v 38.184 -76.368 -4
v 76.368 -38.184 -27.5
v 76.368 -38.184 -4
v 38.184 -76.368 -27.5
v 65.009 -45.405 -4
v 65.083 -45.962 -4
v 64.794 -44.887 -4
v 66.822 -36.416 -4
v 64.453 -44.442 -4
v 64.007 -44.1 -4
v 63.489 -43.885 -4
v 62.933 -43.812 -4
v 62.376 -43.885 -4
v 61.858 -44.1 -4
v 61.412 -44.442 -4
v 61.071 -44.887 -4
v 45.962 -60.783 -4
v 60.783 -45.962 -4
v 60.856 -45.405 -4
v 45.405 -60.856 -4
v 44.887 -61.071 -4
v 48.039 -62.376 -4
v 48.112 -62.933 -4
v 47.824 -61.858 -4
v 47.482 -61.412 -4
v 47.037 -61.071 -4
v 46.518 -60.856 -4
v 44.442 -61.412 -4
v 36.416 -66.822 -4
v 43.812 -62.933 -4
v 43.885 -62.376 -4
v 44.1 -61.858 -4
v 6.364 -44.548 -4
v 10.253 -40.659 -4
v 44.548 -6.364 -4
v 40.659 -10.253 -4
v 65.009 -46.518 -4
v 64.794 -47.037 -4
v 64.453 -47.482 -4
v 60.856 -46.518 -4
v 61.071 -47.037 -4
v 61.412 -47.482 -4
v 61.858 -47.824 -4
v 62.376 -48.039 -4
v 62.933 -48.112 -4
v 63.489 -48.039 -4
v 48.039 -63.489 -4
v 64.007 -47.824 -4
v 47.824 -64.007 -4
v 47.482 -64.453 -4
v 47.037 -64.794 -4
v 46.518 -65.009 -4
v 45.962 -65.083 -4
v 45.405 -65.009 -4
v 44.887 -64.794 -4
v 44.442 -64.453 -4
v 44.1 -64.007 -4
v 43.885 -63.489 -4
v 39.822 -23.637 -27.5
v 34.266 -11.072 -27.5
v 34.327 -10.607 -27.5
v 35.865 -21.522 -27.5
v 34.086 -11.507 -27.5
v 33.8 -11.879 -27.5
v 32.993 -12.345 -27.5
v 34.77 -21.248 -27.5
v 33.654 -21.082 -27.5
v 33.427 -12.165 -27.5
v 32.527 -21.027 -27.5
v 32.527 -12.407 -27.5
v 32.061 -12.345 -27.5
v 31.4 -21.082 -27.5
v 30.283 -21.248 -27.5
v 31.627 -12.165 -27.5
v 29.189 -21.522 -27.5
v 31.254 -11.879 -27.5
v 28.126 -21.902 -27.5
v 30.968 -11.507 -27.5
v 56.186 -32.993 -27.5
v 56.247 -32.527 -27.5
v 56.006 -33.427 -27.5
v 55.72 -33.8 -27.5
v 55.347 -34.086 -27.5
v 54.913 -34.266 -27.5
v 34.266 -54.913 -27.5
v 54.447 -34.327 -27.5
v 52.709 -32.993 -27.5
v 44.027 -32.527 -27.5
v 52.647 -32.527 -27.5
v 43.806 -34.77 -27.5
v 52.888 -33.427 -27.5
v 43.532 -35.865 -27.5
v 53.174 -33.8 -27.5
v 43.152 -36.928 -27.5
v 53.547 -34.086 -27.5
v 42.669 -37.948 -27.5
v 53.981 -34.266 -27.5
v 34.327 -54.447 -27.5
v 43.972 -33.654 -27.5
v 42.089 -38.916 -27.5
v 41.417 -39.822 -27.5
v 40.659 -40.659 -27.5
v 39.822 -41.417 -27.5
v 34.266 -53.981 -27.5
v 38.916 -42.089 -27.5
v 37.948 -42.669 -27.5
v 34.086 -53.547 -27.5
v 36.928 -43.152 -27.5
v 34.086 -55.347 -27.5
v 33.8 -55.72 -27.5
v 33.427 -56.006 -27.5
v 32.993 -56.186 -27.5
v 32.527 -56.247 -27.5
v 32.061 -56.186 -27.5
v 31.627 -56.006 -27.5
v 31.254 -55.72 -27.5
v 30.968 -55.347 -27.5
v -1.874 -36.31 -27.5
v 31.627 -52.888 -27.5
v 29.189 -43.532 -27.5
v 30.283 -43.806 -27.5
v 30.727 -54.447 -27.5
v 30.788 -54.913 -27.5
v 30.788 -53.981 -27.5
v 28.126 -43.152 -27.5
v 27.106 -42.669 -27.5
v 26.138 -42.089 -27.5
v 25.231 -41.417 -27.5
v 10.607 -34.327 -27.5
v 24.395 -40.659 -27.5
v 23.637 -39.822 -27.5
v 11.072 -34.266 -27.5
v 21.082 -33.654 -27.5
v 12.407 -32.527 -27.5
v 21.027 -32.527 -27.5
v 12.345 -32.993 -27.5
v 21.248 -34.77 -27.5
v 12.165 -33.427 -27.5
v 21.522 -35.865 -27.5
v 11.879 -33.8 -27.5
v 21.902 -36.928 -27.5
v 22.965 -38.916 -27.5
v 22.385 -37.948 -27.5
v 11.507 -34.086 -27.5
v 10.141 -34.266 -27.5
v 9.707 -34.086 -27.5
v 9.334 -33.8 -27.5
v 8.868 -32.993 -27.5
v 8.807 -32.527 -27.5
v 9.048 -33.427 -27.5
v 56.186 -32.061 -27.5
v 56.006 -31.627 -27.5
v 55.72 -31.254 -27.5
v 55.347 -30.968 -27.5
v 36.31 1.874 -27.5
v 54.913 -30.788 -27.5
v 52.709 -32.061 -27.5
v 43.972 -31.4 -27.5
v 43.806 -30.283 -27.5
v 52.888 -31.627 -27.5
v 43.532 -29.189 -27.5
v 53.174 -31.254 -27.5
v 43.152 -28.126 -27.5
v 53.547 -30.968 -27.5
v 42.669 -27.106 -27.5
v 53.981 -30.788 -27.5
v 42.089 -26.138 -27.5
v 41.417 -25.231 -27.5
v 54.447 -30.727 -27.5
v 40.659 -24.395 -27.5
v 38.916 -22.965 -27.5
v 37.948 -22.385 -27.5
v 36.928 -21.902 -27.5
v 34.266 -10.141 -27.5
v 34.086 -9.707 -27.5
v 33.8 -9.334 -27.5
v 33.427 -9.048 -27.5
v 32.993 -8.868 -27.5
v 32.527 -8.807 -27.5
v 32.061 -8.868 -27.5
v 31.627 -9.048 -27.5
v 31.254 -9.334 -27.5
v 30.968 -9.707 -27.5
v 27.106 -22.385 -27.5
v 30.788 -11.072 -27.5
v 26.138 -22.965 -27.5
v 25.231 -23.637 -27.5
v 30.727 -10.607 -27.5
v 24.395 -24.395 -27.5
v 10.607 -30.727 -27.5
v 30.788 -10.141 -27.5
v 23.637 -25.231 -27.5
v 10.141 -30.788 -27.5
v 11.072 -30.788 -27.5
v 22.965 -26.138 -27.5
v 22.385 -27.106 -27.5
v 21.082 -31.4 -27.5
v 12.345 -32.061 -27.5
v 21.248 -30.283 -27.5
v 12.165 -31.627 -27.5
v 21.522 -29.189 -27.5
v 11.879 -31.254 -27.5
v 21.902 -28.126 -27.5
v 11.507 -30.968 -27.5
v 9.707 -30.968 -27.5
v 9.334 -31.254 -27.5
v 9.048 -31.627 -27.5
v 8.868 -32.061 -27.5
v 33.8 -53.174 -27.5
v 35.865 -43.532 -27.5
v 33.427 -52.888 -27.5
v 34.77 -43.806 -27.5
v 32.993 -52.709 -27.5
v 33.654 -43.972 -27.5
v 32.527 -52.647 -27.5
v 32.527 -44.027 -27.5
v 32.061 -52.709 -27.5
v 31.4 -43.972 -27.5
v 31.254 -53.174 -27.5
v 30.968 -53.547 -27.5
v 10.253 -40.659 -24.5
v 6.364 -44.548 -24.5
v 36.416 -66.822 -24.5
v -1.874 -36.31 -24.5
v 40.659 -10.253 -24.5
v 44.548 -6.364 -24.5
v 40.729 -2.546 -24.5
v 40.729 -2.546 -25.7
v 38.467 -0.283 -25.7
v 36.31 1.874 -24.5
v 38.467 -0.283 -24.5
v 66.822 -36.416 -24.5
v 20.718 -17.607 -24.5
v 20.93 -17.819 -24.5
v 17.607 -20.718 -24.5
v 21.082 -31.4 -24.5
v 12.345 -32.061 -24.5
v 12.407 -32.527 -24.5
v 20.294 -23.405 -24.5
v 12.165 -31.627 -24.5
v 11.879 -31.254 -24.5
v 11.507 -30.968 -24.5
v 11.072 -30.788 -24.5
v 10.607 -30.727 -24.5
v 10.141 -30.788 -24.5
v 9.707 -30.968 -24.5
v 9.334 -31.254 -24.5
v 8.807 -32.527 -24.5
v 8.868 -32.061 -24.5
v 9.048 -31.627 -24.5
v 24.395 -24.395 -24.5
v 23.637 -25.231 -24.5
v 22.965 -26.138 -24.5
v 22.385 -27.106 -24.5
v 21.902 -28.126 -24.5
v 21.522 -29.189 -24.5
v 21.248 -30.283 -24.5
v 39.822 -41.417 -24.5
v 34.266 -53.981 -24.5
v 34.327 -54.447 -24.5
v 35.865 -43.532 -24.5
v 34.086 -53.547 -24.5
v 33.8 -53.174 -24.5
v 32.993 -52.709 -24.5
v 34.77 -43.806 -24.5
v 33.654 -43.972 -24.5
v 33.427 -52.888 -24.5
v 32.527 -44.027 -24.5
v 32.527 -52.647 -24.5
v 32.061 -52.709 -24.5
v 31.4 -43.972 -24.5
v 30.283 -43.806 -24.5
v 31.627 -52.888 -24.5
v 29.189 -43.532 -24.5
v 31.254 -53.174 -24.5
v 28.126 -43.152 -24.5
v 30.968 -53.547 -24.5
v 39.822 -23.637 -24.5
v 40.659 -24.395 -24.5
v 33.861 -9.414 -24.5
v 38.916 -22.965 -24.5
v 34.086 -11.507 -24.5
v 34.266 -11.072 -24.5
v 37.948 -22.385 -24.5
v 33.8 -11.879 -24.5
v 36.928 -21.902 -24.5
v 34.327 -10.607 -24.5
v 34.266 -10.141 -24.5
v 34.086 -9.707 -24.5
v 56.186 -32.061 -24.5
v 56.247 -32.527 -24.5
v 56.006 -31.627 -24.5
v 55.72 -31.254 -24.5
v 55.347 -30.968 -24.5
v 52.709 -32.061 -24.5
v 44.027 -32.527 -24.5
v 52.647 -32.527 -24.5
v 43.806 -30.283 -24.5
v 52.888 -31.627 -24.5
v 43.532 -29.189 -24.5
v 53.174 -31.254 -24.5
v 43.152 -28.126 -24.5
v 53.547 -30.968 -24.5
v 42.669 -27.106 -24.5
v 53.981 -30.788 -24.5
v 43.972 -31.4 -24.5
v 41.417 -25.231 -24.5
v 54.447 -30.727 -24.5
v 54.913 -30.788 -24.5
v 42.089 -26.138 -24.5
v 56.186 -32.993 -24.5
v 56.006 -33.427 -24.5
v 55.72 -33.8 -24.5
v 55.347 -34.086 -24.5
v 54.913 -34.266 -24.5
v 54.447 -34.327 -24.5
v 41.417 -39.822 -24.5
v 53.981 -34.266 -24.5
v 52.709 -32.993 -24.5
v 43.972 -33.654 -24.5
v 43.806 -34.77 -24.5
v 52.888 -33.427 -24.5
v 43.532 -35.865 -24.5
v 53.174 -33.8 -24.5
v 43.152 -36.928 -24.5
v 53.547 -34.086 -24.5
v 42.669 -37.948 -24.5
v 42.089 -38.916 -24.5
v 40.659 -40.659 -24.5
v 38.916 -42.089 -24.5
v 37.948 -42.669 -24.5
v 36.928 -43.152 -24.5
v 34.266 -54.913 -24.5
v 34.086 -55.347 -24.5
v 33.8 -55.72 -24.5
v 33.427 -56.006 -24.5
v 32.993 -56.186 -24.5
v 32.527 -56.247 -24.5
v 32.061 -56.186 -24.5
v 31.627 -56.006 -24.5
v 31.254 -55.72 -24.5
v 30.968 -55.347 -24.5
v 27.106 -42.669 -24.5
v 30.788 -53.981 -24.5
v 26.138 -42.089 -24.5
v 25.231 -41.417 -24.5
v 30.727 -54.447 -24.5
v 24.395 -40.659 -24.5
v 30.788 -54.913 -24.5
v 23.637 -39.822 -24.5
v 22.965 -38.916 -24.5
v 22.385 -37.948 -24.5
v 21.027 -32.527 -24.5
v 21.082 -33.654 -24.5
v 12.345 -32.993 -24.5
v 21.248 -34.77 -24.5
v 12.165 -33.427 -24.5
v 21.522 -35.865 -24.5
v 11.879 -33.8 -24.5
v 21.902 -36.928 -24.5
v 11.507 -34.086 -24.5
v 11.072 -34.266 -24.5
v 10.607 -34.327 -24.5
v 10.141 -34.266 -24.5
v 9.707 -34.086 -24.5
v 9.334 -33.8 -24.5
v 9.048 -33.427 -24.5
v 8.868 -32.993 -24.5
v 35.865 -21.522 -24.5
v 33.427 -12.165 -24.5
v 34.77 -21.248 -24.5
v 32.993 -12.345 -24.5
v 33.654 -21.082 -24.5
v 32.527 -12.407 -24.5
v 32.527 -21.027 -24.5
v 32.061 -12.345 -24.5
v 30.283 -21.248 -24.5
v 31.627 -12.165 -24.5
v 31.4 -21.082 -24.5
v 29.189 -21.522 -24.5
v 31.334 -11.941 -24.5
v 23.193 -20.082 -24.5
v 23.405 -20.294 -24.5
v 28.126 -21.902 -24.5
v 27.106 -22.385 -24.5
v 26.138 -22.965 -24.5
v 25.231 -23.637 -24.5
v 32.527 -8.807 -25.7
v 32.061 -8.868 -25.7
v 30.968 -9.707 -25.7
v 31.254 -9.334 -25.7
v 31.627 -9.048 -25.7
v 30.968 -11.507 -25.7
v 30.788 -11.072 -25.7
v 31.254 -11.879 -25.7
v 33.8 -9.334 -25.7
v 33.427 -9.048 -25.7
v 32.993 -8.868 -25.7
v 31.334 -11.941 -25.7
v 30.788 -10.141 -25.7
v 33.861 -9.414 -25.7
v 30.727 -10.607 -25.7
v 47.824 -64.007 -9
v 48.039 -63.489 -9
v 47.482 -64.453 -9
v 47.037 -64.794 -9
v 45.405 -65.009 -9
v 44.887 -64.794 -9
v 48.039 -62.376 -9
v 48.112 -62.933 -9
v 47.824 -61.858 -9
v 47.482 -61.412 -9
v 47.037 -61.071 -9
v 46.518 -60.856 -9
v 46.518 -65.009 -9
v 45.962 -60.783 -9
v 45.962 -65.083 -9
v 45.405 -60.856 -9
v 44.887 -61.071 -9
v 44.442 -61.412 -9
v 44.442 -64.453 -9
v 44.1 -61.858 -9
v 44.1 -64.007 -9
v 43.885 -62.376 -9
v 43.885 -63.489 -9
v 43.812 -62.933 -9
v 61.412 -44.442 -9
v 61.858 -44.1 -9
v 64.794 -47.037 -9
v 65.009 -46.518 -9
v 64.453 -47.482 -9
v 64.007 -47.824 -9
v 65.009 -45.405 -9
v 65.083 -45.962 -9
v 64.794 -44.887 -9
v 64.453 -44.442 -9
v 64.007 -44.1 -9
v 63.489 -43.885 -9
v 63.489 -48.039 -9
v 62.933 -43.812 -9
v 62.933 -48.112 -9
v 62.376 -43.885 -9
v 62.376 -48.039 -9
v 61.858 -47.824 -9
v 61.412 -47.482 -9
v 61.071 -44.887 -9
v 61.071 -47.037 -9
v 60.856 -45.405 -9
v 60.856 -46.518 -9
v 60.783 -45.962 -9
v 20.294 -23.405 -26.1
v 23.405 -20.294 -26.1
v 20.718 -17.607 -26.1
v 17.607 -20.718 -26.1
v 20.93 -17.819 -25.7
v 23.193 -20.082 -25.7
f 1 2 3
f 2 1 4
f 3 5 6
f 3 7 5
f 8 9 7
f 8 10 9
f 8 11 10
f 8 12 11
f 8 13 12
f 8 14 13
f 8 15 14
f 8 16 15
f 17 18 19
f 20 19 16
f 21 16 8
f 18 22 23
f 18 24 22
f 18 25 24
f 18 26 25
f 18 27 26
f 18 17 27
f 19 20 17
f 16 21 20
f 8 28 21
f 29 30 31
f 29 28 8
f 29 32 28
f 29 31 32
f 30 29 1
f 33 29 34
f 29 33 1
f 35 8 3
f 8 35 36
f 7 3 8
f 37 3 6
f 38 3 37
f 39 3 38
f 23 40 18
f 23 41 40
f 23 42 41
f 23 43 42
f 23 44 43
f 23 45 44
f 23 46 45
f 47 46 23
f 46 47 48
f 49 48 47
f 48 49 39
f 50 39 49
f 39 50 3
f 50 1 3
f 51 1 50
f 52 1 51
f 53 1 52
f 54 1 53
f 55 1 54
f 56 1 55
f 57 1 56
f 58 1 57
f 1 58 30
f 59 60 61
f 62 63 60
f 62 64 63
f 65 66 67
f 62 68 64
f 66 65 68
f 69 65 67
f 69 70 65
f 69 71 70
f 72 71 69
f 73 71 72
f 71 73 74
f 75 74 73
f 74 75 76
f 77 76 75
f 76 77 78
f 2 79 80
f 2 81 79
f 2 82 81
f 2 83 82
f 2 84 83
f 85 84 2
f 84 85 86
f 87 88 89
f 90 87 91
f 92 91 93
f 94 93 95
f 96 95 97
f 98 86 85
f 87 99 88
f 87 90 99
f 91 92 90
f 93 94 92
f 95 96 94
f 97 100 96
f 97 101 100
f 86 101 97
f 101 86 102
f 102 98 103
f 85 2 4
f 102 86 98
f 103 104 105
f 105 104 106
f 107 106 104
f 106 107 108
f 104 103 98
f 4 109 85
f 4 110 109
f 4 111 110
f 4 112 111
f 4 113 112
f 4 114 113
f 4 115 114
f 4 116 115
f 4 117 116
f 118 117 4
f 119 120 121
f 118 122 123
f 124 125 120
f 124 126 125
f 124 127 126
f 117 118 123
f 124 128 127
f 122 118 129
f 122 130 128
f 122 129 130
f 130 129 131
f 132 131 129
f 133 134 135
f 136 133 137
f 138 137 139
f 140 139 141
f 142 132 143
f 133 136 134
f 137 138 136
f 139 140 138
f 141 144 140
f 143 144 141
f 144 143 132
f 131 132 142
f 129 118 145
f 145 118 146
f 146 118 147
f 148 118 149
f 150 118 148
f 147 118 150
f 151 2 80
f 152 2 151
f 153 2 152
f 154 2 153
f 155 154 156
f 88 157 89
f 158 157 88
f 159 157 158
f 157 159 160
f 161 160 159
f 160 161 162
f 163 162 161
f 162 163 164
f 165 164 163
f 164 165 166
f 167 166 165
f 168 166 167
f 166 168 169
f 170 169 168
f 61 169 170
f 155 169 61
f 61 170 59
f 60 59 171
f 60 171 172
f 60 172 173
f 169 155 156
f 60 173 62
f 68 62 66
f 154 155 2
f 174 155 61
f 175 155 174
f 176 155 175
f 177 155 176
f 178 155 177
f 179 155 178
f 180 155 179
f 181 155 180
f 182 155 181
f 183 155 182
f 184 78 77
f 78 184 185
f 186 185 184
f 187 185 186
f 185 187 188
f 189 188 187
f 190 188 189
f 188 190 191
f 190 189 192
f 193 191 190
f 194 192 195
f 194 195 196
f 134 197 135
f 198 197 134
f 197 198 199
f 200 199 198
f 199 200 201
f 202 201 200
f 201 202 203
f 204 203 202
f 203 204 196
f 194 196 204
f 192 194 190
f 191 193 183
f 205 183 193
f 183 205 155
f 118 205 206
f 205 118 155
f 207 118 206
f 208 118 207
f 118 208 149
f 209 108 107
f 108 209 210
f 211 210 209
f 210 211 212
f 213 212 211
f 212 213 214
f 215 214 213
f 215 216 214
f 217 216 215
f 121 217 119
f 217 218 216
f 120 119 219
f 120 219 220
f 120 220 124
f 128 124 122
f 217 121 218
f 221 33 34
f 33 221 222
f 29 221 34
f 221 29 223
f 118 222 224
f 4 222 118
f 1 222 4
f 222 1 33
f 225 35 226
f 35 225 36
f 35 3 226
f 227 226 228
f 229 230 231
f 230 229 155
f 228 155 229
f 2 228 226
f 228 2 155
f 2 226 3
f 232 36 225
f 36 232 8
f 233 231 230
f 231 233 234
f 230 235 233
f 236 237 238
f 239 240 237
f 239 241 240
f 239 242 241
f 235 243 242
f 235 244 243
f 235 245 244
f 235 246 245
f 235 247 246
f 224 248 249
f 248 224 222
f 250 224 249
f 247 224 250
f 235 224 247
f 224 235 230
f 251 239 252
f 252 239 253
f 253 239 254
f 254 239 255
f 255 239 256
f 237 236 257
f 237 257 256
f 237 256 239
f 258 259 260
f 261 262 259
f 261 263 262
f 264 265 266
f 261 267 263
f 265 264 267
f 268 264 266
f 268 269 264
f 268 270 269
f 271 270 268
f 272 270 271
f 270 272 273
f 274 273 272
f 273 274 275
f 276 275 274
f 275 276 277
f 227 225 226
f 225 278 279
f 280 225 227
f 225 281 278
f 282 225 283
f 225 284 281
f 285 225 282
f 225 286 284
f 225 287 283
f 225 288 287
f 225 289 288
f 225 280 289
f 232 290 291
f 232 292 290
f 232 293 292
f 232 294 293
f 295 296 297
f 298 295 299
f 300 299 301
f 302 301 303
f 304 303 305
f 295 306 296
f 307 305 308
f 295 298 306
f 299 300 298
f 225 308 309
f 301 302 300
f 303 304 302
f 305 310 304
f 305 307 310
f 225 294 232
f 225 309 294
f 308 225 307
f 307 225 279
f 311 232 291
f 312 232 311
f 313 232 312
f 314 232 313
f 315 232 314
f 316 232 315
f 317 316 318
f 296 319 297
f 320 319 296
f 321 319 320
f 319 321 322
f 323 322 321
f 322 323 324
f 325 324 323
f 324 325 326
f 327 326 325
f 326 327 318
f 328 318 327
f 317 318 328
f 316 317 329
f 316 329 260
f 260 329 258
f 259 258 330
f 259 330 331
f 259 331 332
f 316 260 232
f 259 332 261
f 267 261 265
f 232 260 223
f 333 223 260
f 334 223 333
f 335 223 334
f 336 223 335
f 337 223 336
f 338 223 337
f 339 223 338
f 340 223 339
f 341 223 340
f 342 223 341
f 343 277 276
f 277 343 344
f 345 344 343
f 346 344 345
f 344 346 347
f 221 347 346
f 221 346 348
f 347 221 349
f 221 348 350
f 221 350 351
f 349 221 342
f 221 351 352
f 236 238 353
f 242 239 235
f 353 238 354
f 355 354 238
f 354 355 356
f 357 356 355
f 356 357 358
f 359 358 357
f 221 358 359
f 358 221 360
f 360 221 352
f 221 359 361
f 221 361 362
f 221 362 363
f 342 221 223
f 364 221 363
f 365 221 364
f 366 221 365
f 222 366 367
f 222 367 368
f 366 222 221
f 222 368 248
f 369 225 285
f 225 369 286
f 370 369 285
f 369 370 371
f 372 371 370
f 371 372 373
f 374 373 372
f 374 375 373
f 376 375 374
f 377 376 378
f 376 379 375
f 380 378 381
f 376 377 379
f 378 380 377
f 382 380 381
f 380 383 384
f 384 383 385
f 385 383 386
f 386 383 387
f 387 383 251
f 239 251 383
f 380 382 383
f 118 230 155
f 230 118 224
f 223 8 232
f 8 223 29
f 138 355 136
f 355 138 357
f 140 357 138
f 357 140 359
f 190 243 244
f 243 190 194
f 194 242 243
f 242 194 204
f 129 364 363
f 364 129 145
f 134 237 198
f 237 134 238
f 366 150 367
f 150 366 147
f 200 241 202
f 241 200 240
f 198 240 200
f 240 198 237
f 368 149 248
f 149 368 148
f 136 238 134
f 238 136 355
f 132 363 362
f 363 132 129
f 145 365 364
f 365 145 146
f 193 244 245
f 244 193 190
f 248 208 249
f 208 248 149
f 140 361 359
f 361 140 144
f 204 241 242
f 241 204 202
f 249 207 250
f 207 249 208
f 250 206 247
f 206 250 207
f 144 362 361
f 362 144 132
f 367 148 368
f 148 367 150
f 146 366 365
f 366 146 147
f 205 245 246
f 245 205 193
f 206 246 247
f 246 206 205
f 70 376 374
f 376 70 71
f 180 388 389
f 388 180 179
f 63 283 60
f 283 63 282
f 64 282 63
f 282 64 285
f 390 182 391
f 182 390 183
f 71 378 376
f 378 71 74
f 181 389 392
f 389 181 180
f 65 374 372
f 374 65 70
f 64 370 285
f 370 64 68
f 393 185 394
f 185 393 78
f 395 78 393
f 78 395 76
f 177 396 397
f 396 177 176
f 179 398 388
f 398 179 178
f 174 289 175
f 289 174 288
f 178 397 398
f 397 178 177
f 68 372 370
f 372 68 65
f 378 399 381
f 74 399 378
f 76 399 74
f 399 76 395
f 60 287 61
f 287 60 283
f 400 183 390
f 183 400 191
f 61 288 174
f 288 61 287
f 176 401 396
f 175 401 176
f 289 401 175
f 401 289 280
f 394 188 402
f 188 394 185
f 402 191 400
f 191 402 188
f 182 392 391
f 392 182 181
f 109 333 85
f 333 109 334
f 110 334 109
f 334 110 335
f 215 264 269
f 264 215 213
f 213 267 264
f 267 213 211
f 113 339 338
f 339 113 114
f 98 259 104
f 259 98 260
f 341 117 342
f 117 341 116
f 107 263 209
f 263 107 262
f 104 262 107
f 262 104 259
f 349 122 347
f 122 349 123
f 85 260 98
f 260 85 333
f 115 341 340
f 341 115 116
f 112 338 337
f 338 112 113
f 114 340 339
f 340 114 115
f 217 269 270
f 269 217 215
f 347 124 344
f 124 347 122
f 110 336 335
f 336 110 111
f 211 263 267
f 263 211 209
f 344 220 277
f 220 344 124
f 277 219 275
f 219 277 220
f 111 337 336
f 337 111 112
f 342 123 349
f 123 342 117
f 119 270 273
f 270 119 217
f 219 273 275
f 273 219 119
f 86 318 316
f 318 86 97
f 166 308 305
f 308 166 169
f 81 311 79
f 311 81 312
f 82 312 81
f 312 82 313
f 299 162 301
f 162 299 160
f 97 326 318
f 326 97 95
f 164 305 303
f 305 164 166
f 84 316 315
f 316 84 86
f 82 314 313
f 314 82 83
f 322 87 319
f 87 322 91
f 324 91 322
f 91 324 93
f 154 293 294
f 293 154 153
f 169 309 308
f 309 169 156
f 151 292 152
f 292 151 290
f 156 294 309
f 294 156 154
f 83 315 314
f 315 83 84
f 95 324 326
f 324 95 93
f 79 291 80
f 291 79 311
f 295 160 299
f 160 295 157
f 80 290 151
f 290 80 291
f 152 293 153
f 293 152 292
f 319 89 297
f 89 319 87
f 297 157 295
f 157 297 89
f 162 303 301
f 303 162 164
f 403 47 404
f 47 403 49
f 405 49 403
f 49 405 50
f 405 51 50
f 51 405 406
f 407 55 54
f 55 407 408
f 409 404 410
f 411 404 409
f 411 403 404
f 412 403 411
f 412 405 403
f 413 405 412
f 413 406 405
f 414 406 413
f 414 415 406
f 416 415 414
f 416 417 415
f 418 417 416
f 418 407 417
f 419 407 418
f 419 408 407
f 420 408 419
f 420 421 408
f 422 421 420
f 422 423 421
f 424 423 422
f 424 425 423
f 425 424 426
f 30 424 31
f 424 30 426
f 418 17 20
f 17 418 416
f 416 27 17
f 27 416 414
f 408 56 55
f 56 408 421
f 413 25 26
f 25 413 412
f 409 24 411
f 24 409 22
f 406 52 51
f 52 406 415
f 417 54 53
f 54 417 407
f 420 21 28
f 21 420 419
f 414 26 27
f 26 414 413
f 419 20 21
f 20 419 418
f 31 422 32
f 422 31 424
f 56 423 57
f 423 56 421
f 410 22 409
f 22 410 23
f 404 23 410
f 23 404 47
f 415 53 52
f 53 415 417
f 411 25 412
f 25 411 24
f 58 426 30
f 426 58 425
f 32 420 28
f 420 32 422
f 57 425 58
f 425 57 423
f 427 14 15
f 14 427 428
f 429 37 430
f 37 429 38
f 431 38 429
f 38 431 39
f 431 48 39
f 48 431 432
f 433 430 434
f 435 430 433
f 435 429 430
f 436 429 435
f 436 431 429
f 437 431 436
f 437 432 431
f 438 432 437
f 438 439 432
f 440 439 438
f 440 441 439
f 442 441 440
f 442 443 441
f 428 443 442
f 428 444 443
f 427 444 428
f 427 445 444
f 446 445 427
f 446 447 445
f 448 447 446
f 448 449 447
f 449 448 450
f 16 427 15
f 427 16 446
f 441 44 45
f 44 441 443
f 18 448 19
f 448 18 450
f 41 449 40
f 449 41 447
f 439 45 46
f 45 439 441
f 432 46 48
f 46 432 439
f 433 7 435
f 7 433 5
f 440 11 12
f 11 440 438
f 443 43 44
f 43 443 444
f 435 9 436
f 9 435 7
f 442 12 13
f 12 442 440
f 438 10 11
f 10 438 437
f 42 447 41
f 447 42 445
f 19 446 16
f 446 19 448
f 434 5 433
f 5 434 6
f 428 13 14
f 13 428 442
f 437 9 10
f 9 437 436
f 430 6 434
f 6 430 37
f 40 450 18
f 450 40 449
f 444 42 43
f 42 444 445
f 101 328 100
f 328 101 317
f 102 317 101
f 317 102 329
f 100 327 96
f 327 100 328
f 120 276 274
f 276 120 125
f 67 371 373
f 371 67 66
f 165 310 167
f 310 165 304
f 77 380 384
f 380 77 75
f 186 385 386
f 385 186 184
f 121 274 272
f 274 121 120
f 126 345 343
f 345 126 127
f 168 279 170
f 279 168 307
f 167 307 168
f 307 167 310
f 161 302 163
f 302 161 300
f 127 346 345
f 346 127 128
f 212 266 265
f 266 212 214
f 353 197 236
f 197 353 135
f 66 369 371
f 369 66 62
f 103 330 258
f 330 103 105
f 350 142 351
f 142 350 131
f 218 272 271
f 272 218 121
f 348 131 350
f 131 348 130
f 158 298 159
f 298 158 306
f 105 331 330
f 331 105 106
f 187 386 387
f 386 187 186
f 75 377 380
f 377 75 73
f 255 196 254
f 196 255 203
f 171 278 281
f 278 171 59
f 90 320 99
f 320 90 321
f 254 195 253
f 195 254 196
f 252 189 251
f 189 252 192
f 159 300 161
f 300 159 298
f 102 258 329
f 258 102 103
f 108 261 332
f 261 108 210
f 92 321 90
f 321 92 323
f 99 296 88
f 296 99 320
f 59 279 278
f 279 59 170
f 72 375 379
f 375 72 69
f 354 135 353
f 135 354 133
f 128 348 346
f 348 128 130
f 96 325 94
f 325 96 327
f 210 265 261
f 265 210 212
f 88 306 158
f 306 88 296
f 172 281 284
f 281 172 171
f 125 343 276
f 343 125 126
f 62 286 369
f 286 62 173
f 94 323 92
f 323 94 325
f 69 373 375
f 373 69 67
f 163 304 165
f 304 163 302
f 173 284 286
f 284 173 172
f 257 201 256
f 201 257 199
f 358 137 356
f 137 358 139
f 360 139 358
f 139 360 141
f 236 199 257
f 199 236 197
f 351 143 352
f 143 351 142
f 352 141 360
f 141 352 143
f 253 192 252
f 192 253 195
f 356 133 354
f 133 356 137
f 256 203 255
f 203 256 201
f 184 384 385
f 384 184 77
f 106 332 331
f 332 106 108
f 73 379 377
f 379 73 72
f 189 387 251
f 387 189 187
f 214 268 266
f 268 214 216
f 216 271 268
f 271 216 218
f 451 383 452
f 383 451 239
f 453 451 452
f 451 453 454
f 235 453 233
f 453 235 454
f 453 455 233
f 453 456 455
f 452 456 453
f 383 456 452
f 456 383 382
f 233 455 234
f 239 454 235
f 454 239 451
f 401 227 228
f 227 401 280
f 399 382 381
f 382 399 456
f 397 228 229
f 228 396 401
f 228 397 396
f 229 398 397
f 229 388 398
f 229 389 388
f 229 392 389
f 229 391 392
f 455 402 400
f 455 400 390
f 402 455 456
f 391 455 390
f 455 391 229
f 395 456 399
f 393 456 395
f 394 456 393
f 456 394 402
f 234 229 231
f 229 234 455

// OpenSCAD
// file: ../level2.scad
// Level 2 - shared dimensions for the drive deck, motor bracket, body and skirt.
// Frame: origin at the centre of the deck's TOP surface; +Z up, +Y = front (display), +X = right.
// The lazy Susan sits on the deck's plinth; the turntable pulley hangs through the deck's hole.
include <params.scad>

// ---- outline -------------------------------------------------------------------------------
l2_size   = [160, 160];     // footprint (rounded square), same for body and skirt
l2_r      = 14;             // corner radius
l2_h      = 90;             // body height (floor to the deck's underside... see body)
l2_wall   = 2.5;            // body walls

// ---- deck ----------------------------------------------------------------------------------
deck_t    = 4;              // deck plate: z = -deck_t .. 0
deck_hole = 112;            // reach the inner ring's bolts from below during assembly

// ---- lazy Susan + turntable pulley (turntable_pulley.scad) --------------------------------
z_ls      = plinth_h;                    // lazy Susan's underside (on the plinth): 2
z_plate   = z_ls + ls_h;                 // turntable plate's underside = inner ring top: 12.5
belt_drop = 24.5;                        // plate underside -> belt centre (turntable_pulley)
z_belt    = z_plate - belt_drop;         // -12: belt centre, below the deck top
pulley_R  = 100 * 2 / PI / 2;            // 31.83: ring pulley pitch radius (100 T)
pulley_bottom = z_belt - 3.2 - 1.6 - 2.2;  // -19: lowest point of the hanging pulley
clamp_r   = 35.5;                        // pulley's belt clamp block (its widest part)

// ---- motor ----------------------------------------------------------------------------------
motor_a   = -45;            // direction of the motor from the centre: back-right corner
motor_C   = 46;             // nominal centre distance; the bracket slides +/- tension_travel (42..50:
                            //   at 41 the motor pulley would touch the ring pulley's flange)
tension_travel = 4;
nema      = [42.3, 23];     // pancake NEMA17: square, body length
nema_holes = 31;            // M3 screw spacing on its face
nema_boss = 22;             // centring boss on its face (dia), ~2 tall
mp_T      = 20;             // motor pulley teeth
mp_len    = 16;             // motor pulley overall length (EST: 7 hub + 1 + 7 teeth + 1)
mp_teeth_c = 11.5;          // pulley bottom -> centre of its teeth (EST)
z_mp_bottom = z_belt - mp_teeth_c;       // -23.5
bracket_t = 3;              // motor plate thickness
z_bracket_top = z_mp_bottom - 1;         // -24.5: motor plate top (pulley hub 1 mm above it)
z_motor_face  = z_bracket_top - bracket_t;   // -27.5
z_motor_bottom = z_motor_face - nema[1];     // -50.5
// main file
// Motor bracket - hangs the pancake NEMA17 (shaft up) under the drive deck so its 20 T pulley
// lines up with the turntable pulley's teeth. Two M3 screws from above the deck, through its
// radial slots, into heat-set inserts in the bracket's far wall: slide it outward to tension the
// belt. The motor screws to the plate from above (4 x M3) before the bracket goes in.
//
// Also carries the HOMING SENSOR: an A3144-type Hall sensor lying face-up in a pocket on the
// plate, under the turntable pulley's bottom edge. A small magnet glued under the pulley (on the
// flat ring of its bottom face, ~28 mm from the centre, on the motor side when the head looks
// straight ahead) passes ~3.5 mm above it at home. Its leads run along a groove to the side.
//
// Modelled in place (deck frame, see level2.scad) with the plate at the bottom.
// PRINT as modelled: plate on the bed, walls up, no supports. PETG.
include <../level2.scad>

m3_clear  = 3.6;
plate_u   = [-nema[0] / 2 - 0.5, 35];     // plate extent along the radial line (motor frame)
half_v    = 27;                           // half-width across it
side_wall = 5.5;                          // side walls, |v| = half_v - side_wall .. half_v
side_u0   = -10;                          // side walls start here: clear of the pulley's clamp
                                          //   block even with the bracket slid 4 mm inward
far_wall  = [27, 35];                     // far wall (u range): takes the two deck screws
slot_u    = 31; slot_v = 12;              // must match drive_deck.scad
hall      = [3.4 + 0.4, 4.0 + 0.4, 1.6];  // A3144 TO-92 lying flat: [u, v, depth]
hall_u    = -17;                          // ~28 mm from the turntable's centre

module bracket() {
    z0 = z_motor_face;                    // plate underside = motor face
    z1 = -deck_t;                         // wall tops = deck underside
    difference() {
        union() {
            // motor plate
            translate([plate_u[0], -half_v, z0]) cube([plate_u[1] - plate_u[0], 2 * half_v, bracket_t]);
            // side walls
            for (s = [-1, 1]) translate([side_u0, s > 0 ? half_v - side_wall : -half_v, z0])
                cube([plate_u[1] - side_u0, side_wall, z1 - z0]);
            // far wall
            translate([far_wall[0], -half_v, z0]) cube([far_wall[1] - far_wall[0], 2 * half_v, z1 - z0]);
        }
        // motor centring boss and its four screws
        translate([0, 0, z0 - 1]) cylinder(d = nema_boss + 1, h = bracket_t + 2, $fn = 64);
        for (su = [-1, 1], sv = [-1, 1]) translate([su * nema_holes / 2, sv * nema_holes / 2, z0 - 1])
            cylinder(d = m3_clear, h = bracket_t + 2, $fn = 24);
        // heat-set inserts for the deck screws
        for (v = [-slot_v, slot_v]) translate([slot_u, v, z1 - insert_m3[1]]) cylinder(d = insert_m3[0], h = insert_m3[1] + 1, $fn = 24);
        // Hall sensor pocket + lead groove to the side
        translate([hall_u - hall[0] / 2, -hall[1] / 2, z0 + bracket_t - hall[2]]) cube([hall[0], hall[1], hall[2] + 1]);
        translate([hall_u - 1.6, 0, z0 + bracket_t - 1.2]) cube([3.2, half_v + 1, 2]);
    }
}

rotate(motor_a) translate([motor_C, 0, 0]) bracket();

// ghosts (not printed): motor and its pulley
%rotate(motor_a) translate([motor_C, 0, 0]) {
    translate([-nema[0] / 2, -nema[0] / 2, z_motor_bottom]) cube([nema[0], nema[0], nema[1]]);
    translate([0, 0, z_mp_bottom]) cylinder(d = 16, h = mp_len);
}
